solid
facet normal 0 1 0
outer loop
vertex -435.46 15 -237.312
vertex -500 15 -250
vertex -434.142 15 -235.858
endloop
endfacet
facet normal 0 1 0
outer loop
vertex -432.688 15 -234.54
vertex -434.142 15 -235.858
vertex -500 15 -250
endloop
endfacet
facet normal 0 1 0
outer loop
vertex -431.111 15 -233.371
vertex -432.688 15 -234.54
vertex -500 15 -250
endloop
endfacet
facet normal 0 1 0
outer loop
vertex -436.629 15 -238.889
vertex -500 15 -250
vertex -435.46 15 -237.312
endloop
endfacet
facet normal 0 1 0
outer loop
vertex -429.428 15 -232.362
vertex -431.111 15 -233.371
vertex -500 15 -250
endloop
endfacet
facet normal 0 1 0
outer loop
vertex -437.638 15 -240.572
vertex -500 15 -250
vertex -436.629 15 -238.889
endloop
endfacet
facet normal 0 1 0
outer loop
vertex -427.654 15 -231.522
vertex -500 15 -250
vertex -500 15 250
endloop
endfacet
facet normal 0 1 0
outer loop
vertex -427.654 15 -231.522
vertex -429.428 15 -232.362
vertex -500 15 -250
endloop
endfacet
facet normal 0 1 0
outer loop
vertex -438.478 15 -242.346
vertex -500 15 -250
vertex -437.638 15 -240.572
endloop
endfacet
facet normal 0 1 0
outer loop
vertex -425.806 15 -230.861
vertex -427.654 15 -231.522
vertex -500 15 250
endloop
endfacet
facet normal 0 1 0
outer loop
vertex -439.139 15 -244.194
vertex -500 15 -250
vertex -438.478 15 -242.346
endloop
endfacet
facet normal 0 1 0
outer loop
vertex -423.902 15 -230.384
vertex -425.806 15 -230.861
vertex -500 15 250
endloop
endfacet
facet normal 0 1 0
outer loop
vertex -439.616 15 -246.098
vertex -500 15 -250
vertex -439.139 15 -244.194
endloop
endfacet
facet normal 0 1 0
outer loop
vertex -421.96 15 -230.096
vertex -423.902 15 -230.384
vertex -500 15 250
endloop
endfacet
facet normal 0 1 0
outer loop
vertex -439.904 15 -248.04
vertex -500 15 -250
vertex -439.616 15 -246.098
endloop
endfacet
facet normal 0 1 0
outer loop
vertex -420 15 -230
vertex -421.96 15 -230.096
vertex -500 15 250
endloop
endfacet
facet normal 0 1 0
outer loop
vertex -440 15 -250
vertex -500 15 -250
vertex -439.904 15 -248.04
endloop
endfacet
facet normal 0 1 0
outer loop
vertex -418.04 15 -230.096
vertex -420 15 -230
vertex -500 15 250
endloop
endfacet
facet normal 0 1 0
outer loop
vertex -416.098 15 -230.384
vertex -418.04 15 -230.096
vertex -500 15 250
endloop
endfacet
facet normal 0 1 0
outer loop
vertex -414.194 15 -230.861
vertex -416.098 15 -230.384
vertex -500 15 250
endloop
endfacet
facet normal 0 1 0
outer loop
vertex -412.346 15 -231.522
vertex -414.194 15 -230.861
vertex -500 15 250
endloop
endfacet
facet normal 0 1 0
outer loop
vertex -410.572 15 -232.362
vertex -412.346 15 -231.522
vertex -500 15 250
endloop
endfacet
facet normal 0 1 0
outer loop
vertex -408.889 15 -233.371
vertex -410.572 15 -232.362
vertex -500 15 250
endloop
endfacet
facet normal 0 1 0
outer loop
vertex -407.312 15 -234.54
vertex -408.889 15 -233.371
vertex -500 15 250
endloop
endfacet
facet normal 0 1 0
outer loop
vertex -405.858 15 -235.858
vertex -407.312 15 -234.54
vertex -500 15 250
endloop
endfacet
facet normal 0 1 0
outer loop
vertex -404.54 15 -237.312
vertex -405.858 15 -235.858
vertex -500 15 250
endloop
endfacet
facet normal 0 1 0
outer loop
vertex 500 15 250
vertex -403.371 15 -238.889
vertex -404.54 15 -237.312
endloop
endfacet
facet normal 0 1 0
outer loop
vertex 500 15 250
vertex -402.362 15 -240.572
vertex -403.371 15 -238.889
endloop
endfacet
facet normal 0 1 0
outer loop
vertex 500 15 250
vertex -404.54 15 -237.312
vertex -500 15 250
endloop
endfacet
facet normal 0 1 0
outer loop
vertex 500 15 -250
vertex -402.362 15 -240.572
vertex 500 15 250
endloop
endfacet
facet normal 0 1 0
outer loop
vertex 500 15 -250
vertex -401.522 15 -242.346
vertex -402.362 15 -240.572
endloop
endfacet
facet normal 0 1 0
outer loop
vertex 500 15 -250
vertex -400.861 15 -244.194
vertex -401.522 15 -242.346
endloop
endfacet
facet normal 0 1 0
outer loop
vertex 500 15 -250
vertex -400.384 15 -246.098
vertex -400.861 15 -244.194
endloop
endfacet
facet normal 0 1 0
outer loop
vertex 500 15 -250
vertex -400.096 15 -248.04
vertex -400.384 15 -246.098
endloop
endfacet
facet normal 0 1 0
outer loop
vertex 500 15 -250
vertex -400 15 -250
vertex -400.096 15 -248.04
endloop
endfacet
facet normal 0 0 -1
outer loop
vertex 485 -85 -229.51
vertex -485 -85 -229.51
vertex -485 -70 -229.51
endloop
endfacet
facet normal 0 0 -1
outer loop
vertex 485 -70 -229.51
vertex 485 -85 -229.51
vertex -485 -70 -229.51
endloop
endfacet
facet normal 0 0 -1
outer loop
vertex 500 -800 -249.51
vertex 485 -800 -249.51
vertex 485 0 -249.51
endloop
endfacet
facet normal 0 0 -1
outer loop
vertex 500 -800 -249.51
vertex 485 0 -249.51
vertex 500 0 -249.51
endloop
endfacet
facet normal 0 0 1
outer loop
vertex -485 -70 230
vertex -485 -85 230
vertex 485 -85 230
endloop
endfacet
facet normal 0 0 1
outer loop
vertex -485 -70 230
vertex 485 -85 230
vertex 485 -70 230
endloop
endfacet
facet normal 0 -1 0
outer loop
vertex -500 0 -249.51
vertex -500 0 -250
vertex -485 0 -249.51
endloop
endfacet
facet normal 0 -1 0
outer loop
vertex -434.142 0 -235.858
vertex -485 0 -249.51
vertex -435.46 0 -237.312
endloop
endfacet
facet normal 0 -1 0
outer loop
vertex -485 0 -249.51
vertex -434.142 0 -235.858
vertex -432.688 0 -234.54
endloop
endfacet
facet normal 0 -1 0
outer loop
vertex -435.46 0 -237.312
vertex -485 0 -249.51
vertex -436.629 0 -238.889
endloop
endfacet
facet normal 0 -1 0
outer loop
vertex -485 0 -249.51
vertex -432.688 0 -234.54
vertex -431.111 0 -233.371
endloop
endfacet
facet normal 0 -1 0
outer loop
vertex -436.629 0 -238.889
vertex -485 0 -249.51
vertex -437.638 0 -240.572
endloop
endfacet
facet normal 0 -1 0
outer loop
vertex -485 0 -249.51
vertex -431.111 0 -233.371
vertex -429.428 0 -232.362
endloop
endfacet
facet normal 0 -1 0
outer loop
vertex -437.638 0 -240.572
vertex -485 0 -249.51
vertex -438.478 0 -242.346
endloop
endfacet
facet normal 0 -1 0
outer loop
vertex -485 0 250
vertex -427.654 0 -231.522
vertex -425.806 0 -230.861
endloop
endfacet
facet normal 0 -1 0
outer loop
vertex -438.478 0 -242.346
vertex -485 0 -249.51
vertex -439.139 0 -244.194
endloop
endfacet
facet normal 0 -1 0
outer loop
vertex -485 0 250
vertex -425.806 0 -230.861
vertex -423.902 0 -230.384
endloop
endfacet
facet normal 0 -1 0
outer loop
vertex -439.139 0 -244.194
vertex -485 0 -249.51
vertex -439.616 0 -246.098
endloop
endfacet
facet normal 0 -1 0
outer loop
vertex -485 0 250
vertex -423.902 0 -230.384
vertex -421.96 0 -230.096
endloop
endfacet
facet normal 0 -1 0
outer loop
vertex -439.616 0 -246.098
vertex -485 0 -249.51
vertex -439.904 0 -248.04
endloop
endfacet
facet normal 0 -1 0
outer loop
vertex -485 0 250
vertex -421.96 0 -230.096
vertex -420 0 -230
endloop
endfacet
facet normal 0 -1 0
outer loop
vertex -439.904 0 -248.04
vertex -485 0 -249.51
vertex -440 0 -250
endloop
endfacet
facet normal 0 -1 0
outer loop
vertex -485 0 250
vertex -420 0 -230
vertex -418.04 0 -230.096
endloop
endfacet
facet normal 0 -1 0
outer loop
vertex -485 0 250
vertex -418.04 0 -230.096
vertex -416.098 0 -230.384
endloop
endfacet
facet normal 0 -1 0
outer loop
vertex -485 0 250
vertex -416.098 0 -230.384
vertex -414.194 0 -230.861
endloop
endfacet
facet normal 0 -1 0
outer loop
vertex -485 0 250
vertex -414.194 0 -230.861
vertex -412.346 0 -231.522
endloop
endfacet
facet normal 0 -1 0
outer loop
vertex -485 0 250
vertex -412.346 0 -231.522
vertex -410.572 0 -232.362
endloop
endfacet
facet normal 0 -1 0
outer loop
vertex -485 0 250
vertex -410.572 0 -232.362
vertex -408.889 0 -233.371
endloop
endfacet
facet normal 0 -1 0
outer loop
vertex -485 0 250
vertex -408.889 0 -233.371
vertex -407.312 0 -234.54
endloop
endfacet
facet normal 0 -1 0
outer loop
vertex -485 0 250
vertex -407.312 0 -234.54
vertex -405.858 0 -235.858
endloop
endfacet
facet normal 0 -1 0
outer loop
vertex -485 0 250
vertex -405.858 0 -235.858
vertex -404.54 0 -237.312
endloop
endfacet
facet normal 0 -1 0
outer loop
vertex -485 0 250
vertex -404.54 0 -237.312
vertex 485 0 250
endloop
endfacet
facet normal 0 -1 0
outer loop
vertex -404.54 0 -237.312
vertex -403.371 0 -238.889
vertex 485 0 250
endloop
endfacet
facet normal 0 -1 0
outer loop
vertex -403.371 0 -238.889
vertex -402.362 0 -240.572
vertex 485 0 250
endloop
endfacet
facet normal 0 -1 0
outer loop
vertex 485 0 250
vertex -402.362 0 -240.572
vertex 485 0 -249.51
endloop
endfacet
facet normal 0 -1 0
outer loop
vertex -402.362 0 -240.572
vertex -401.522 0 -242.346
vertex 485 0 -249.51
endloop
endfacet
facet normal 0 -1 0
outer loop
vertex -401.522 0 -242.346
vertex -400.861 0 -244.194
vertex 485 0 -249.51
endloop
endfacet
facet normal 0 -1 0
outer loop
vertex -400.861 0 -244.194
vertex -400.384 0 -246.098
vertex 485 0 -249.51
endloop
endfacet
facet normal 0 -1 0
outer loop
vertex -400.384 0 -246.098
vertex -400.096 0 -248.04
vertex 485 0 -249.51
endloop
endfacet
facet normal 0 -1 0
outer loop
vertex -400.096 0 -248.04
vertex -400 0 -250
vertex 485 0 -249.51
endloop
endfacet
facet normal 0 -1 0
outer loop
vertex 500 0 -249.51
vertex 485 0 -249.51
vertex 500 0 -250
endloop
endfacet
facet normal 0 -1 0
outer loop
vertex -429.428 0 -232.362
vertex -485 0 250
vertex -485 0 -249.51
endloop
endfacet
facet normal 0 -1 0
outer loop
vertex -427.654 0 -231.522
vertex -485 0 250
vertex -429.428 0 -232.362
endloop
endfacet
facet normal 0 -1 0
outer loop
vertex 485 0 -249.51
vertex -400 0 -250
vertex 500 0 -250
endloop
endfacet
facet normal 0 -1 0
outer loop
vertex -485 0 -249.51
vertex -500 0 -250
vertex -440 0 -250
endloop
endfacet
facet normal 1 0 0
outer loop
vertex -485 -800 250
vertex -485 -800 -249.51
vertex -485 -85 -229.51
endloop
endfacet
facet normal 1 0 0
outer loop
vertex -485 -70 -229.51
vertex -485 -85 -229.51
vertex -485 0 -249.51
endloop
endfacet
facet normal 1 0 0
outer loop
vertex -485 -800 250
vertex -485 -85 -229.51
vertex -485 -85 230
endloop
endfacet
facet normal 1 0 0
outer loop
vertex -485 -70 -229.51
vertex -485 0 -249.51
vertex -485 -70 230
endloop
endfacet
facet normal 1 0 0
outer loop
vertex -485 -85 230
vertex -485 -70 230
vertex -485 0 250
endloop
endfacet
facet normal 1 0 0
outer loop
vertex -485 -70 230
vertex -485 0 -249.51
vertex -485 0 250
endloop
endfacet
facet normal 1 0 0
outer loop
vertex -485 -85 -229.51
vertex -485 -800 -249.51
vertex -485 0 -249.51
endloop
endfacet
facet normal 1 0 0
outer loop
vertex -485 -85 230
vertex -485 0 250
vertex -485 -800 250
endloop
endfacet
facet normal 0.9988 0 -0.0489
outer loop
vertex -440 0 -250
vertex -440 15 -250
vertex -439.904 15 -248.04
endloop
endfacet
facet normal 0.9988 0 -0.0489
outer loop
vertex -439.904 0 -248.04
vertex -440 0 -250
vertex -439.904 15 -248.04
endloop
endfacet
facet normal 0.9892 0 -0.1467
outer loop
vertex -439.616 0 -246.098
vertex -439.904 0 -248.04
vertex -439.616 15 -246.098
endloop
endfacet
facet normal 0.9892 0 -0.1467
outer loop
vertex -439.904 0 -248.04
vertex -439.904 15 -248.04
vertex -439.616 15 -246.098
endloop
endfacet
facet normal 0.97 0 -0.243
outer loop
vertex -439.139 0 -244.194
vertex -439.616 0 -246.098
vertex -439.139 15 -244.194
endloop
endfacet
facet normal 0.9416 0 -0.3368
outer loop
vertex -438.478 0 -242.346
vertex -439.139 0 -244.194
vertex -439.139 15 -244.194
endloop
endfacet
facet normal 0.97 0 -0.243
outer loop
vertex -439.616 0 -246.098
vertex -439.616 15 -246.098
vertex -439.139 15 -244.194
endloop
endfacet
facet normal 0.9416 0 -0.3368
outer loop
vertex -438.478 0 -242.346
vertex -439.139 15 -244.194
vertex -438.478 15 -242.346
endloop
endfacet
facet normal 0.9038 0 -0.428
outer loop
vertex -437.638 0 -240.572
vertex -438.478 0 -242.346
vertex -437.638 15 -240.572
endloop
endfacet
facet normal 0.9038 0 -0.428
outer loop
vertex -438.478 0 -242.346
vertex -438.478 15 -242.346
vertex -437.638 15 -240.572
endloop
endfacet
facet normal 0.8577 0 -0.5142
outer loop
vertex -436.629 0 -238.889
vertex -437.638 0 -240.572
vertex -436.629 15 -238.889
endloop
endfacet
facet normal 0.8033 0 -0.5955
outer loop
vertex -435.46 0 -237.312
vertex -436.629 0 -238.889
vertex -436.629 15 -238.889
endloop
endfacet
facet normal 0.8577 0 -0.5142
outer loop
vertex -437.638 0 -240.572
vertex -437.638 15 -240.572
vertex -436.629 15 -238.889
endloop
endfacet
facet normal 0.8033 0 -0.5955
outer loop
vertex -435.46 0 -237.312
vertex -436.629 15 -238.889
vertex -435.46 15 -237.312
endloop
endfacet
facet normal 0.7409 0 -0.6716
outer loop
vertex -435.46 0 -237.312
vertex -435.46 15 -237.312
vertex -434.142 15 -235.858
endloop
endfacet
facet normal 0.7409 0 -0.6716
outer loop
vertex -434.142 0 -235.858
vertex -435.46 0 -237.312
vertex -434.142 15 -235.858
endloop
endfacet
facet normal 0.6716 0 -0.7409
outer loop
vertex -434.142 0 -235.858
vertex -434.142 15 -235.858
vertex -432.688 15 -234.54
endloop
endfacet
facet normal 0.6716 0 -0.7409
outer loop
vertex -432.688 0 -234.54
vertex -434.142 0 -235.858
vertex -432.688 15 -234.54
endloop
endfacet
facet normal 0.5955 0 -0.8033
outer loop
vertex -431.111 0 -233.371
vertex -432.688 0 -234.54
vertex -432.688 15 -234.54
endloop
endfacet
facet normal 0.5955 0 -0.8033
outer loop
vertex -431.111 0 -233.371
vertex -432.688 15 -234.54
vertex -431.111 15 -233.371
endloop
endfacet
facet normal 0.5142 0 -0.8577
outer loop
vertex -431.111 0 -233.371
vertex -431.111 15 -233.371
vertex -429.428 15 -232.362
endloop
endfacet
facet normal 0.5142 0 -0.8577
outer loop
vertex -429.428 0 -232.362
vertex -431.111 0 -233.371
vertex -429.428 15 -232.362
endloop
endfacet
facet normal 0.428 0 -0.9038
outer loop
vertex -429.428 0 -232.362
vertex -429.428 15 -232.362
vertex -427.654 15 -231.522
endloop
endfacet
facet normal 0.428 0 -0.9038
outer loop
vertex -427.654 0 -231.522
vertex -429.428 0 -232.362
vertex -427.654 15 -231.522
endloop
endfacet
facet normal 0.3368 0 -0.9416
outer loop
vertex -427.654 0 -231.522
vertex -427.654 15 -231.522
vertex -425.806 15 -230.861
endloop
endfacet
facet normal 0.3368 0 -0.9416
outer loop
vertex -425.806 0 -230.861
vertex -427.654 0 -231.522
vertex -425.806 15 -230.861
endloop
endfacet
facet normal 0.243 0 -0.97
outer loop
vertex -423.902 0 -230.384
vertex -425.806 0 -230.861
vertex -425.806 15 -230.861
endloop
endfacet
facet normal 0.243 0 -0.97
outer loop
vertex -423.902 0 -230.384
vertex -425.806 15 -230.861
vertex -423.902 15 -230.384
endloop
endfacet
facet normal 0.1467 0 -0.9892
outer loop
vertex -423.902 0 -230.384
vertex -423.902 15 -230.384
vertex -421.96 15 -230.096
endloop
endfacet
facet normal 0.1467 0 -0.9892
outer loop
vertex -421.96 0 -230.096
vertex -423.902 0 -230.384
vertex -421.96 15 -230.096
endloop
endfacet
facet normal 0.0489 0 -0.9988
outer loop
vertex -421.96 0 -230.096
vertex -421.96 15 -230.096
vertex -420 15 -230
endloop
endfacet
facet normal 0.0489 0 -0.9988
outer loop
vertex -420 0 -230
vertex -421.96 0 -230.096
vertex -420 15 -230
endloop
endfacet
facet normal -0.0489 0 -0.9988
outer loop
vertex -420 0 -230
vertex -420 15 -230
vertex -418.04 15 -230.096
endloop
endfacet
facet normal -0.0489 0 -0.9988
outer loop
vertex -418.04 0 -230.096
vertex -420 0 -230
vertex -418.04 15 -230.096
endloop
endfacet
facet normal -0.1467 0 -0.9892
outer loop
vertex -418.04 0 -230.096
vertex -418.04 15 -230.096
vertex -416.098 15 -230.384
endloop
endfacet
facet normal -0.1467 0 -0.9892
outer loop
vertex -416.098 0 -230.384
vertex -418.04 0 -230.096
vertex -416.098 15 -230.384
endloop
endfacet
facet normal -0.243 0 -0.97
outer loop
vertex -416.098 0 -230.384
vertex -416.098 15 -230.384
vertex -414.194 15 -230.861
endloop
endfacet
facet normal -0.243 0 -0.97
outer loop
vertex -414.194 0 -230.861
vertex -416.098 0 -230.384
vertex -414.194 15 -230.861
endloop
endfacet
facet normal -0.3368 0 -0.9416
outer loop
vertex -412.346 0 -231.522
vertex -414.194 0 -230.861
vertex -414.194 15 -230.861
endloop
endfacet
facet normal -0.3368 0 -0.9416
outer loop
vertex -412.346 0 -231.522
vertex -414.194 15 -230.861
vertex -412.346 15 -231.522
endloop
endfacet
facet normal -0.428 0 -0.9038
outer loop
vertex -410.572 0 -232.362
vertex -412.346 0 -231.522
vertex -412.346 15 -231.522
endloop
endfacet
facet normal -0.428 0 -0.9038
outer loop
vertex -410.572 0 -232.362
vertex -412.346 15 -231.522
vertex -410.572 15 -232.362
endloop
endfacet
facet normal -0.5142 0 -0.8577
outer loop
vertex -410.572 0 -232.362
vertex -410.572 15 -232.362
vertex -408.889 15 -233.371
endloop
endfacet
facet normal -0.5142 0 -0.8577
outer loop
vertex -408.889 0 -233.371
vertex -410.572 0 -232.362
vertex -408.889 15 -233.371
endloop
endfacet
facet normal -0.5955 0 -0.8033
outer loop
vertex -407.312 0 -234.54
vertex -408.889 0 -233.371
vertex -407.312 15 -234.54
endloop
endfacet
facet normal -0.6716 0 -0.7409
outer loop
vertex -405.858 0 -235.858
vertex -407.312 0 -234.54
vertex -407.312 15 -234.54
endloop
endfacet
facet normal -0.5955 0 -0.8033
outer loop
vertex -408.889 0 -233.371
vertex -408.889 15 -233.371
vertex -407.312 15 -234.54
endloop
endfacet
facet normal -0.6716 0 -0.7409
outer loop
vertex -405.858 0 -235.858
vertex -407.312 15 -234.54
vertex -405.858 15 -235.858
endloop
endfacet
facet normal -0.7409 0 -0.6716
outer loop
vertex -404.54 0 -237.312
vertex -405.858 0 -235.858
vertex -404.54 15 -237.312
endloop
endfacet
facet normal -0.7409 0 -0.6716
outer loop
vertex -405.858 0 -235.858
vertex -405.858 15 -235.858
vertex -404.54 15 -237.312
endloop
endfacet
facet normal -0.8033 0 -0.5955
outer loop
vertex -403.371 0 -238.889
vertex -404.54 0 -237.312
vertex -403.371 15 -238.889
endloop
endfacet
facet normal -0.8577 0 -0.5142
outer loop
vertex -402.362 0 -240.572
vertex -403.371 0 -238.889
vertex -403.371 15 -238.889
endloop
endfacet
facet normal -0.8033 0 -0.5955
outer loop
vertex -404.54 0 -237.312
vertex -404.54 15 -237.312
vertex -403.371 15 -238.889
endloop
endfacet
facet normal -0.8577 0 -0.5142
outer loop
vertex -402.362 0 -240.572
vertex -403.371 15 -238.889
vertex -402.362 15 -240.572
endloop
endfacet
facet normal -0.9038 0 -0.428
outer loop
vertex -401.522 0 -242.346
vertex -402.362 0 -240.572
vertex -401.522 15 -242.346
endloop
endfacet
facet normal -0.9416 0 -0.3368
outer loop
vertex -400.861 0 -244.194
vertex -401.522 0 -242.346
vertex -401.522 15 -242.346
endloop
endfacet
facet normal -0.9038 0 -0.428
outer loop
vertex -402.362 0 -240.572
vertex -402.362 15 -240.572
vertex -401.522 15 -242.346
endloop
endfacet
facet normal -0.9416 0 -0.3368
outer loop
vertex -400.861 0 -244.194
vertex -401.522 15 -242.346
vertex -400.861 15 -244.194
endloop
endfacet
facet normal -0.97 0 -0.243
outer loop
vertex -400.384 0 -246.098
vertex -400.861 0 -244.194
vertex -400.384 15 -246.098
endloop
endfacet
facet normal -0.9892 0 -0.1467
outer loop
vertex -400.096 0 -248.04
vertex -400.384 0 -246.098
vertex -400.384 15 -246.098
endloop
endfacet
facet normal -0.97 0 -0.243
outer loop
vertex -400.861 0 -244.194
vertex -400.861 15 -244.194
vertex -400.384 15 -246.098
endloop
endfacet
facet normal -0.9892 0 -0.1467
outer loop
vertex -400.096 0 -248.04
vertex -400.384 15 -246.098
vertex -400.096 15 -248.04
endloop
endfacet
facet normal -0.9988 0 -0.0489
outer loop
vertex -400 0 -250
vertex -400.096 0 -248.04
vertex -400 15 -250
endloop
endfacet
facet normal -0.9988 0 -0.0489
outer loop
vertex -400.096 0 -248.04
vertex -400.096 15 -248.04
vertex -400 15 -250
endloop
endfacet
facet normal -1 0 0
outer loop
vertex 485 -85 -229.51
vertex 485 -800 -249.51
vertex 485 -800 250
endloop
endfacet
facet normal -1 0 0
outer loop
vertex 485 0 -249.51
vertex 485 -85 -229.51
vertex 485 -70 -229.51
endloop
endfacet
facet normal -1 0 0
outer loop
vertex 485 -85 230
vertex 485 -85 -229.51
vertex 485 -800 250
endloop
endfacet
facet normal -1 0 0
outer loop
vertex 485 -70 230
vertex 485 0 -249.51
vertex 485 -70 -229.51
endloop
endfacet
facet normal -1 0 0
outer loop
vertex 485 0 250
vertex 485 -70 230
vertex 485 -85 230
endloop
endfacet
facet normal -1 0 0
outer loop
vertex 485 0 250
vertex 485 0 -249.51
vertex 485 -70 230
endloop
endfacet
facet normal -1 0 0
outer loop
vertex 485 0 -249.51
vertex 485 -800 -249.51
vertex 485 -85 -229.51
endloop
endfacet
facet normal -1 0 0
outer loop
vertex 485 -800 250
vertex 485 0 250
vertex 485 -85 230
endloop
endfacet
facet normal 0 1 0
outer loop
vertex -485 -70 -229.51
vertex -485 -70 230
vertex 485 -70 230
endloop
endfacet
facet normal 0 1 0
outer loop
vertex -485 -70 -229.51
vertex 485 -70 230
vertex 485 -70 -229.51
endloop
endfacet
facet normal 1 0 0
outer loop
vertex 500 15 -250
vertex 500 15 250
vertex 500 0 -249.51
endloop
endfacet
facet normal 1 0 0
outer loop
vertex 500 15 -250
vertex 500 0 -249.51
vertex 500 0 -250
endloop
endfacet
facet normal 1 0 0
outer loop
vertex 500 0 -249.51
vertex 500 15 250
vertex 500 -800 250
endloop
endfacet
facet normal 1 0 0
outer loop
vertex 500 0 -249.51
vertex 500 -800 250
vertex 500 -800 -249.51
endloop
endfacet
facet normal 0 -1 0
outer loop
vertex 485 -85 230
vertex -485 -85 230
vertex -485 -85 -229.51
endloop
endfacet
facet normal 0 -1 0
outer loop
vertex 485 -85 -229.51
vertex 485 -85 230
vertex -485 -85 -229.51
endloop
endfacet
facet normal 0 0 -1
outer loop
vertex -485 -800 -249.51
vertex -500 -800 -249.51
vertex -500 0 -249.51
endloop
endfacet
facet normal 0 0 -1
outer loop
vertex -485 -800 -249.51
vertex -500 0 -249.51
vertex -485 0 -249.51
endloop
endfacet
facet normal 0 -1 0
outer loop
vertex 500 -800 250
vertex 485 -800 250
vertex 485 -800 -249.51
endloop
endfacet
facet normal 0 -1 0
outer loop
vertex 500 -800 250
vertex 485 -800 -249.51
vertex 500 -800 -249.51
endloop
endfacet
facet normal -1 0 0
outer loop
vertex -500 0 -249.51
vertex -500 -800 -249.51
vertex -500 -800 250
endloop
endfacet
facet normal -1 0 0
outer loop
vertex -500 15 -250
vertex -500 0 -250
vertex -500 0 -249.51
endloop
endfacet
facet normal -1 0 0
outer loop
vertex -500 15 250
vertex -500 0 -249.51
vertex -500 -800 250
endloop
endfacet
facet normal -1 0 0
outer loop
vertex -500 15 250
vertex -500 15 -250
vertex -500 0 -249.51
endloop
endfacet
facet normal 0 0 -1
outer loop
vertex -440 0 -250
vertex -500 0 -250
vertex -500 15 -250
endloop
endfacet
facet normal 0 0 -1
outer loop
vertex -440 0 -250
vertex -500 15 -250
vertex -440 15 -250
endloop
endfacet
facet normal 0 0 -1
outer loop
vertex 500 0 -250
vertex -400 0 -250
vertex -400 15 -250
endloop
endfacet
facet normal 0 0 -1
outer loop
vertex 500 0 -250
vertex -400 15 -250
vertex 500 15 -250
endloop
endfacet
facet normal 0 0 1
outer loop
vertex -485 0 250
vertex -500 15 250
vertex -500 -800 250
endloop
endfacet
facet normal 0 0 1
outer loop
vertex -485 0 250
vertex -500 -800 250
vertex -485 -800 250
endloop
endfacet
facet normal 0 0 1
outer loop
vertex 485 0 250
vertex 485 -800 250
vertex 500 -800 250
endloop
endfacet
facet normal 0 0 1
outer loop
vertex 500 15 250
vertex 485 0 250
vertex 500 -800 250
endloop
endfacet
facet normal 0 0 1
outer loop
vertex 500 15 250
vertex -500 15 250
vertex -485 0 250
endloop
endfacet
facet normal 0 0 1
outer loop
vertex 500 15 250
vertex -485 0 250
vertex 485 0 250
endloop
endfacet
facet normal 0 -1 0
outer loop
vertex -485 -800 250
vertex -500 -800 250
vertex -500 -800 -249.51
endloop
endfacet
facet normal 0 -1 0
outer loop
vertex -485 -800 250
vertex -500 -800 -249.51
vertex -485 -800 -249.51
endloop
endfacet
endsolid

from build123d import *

# Parameters (mm, degrees)
SKETCH1_W           = 1000
SKETCH1_H           = 500
BOSS_EXTRUDE1_DEPTH = 15
SKETCH2_W           = 15
SKETCH2_H           = 499.509580663
BOSS_EXTRUDE2_DEPTH = 800
BOSS_EXTRUDE3_REACH = 987
SKETCH3_W           = 459.509580663
SKETCH3_H           = 15
SKETCH4_R           = 20
CUT_EXTRUDE1_DEPTH  = 816


with BuildPart() as part:
    # Sketch1 → Boss-Extrude1 (new body)
    with BuildSketch(Plane(origin=(0, 0, 0), x_dir=(1, 0, 0), z_dir=(0, 1, 0))):
        Rectangle(SKETCH1_W, SKETCH1_H)
    extrude(amount=BOSS_EXTRUDE1_DEPTH)

    # Sketch2 → Boss-Extrude2 (add)
    with BuildSketch(Plane.XZ):
        with Locations((-492.5, 0.245209669)):
            Rectangle(SKETCH2_W, SKETCH2_H)
        with Locations((492.5, 0.245209669)):
            Rectangle(SKETCH2_W, SKETCH2_H)
    extrude(amount=BOSS_EXTRUDE2_DEPTH)

    # Sketch3 → Boss-Extrude3 (add, up to next)
    with BuildSketch(Plane(origin=(-485, 0, 0), x_dir=(0, 0, -1), z_dir=(1, 0, 0)), mode=Mode.PRIVATE) as boss_extrude3_sk1:
        with Locations((-0.245209669, -77.5)):
            Rectangle(SKETCH3_W, SKETCH3_H)
    boss_extrude3_tool1 = extrude(boss_extrude3_sk1.sketch, amount=BOSS_EXTRUDE3_REACH, mode=Mode.PRIVATE) - part.part
    add(boss_extrude3_tool1.solids().sort_by_distance((-485, -77.5, 0.24521))[0])

    # Sketch4 → Cut-Extrude1 (cut, through all)
    with BuildSketch(Plane(origin=(0, 15, 0), x_dir=(1, 0, 0), z_dir=(0, 1, 0))):
        with Locations((-420, 250)):
            Circle(SKETCH4_R)
    extrude(amount=-CUT_EXTRUDE1_DEPTH, mode=Mode.SUBTRACT)


solid = part.part
